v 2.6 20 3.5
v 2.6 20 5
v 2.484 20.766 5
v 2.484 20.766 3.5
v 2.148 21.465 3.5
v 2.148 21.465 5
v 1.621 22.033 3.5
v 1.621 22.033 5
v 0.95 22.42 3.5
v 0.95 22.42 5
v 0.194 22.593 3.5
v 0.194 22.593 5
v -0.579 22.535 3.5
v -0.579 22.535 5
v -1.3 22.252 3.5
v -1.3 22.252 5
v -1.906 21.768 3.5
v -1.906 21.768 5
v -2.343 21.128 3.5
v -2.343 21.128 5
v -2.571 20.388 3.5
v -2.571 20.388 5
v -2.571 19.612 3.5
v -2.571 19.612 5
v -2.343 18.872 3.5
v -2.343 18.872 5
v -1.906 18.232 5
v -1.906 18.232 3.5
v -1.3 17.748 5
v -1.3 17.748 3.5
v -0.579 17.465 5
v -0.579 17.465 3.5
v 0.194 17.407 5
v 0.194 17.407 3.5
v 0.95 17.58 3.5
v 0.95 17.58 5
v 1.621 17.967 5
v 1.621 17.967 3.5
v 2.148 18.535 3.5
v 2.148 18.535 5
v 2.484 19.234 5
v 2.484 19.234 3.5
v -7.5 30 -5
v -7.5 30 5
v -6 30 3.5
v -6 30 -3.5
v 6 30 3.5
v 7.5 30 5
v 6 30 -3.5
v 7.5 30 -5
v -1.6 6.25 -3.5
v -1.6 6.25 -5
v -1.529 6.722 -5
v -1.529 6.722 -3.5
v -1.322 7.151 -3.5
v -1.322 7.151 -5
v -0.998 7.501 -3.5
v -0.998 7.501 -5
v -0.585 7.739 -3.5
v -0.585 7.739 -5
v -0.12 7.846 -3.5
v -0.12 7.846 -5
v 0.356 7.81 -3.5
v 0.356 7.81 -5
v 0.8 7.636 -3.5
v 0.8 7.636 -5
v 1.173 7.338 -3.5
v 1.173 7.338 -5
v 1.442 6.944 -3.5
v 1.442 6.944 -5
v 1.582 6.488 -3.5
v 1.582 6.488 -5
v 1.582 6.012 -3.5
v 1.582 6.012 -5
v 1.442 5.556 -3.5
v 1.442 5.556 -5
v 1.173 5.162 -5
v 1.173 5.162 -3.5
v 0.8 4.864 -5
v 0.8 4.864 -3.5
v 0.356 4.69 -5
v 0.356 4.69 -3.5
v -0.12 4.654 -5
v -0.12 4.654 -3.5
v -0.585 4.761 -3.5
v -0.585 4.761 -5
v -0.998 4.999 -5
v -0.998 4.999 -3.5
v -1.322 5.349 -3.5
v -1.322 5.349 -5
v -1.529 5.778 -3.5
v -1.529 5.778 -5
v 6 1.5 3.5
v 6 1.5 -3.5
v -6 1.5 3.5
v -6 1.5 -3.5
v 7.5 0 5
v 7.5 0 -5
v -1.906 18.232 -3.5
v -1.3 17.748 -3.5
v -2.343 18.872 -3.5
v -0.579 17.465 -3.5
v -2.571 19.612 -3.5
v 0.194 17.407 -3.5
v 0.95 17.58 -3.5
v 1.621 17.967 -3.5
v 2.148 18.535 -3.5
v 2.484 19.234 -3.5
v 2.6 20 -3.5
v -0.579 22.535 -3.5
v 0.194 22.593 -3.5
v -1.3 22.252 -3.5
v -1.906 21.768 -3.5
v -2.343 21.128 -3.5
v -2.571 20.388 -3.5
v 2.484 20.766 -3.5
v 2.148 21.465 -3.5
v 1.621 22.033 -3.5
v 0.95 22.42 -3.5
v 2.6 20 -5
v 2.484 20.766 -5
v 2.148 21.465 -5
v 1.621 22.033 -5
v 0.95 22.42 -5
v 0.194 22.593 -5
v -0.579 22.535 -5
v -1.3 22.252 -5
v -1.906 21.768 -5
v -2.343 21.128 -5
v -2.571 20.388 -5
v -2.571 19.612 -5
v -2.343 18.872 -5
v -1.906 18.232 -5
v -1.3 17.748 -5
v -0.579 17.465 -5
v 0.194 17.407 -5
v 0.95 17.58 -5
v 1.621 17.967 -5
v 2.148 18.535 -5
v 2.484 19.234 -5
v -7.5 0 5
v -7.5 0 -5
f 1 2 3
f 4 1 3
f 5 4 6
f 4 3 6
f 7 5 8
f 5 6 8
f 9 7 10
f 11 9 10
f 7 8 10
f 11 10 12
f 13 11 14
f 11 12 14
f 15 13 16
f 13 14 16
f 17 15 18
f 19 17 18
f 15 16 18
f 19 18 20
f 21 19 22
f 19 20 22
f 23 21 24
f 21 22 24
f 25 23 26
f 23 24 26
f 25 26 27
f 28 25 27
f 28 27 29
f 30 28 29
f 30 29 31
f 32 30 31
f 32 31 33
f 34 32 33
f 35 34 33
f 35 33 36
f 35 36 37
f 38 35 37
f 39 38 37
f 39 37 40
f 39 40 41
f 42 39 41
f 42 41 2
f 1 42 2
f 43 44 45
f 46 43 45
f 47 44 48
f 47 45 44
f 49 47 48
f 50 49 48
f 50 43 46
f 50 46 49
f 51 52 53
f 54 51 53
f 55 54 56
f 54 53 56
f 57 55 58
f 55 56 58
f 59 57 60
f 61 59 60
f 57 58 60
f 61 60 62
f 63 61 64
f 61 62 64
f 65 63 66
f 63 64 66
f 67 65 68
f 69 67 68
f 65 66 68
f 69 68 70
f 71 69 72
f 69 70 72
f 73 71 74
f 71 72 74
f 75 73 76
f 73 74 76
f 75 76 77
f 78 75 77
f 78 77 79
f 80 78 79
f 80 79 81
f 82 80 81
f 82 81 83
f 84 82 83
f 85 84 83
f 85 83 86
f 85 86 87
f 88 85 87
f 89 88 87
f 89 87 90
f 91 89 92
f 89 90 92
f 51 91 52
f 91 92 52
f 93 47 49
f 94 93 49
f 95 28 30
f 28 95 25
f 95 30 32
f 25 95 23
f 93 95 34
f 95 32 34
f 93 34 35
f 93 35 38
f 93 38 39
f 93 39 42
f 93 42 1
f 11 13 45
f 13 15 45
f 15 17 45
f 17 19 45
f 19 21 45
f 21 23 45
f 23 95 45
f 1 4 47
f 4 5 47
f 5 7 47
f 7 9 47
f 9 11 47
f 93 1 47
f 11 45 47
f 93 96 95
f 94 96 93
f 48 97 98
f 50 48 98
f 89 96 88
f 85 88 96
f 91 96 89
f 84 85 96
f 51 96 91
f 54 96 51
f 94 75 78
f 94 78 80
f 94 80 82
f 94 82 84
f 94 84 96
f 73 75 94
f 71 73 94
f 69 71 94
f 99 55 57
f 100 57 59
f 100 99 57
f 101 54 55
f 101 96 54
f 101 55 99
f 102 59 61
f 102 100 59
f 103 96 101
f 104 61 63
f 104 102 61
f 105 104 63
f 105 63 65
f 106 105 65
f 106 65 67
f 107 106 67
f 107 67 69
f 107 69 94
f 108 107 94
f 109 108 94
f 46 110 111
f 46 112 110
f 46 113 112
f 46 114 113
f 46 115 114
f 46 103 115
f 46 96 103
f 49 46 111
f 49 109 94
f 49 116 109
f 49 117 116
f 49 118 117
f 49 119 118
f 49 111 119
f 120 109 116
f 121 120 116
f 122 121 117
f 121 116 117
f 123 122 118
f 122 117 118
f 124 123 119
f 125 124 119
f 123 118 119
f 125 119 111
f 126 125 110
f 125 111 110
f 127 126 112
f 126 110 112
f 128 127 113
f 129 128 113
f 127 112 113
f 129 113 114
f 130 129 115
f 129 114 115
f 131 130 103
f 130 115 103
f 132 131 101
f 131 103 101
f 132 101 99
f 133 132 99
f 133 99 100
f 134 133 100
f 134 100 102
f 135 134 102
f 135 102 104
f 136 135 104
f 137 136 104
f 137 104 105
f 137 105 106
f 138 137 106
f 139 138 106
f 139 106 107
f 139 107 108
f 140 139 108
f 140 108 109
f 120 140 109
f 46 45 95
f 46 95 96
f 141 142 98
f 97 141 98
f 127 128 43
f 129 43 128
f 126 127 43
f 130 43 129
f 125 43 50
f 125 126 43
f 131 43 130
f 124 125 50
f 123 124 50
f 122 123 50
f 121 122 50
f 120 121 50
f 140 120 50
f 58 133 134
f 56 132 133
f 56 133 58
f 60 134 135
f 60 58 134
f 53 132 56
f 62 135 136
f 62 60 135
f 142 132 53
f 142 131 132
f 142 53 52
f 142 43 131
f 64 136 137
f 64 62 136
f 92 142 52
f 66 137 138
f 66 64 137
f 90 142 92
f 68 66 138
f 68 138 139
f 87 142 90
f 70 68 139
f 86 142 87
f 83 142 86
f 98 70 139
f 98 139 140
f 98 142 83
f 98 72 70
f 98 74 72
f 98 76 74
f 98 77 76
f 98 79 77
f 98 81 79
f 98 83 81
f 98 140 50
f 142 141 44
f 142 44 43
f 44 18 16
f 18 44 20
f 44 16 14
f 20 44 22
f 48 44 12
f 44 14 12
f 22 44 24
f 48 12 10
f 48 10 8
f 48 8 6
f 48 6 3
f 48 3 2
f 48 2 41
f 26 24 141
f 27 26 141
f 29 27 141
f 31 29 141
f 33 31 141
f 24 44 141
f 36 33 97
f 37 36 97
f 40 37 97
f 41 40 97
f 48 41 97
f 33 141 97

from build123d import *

# Parameters (mm, degrees)
SKETCH_1_W          = 15
SKETCH_1_H          = 10
EXTRUDE_1_DEPTH     = 30
SKETCH_2_W          = 12
SKETCH_2_H          = 7
CUT_EXTRUDE_1_DEPTH = 28.5
SKETCH_3_R          = 2.6
CUT_EXTRUDE_2_DEPTH = 33.5
SKETCH_4_R          = 1.6
CUT_EXTRUDE_3_DEPTH = 1.5


with BuildPart() as part:
    # 草图1 → 凸台-拉伸1 (new body)
    with BuildSketch(Plane(origin=(0, 0, 0), x_dir=(1, 0, 0), z_dir=(0, 1, 0))):
        Rectangle(SKETCH_1_W, SKETCH_1_H)
    extrude(amount=EXTRUDE_1_DEPTH)

    # 草图2 → 切除-拉伸1 (cut)
    with BuildSketch(Plane(origin=(0, 30, 0), x_dir=(1, 0, 0), z_dir=(0, 1, 0))):
        Rectangle(SKETCH_2_W, SKETCH_2_H)
    extrude(amount=-CUT_EXTRUDE_1_DEPTH, mode=Mode.SUBTRACT)

    # 草图3 → 切除-拉伸2 (cut, through all)
    with BuildSketch(Plane.XY.offset(5)):
        with Locations((0, 20)):
            Circle(SKETCH_3_R)
    extrude(amount=-CUT_EXTRUDE_2_DEPTH, mode=Mode.SUBTRACT)

    # 草图4 → 切除-拉伸3 (cut)
    with BuildSketch(Plane(origin=(0, 0, -5), x_dir=(-1, 0, 0), z_dir=(0, 0, -1))):
        with Locations((0, 6.25)):
            Circle(SKETCH_4_R)
    extrude(amount=-CUT_EXTRUDE_3_DEPTH, mode=Mode.SUBTRACT)


solid = part.part
